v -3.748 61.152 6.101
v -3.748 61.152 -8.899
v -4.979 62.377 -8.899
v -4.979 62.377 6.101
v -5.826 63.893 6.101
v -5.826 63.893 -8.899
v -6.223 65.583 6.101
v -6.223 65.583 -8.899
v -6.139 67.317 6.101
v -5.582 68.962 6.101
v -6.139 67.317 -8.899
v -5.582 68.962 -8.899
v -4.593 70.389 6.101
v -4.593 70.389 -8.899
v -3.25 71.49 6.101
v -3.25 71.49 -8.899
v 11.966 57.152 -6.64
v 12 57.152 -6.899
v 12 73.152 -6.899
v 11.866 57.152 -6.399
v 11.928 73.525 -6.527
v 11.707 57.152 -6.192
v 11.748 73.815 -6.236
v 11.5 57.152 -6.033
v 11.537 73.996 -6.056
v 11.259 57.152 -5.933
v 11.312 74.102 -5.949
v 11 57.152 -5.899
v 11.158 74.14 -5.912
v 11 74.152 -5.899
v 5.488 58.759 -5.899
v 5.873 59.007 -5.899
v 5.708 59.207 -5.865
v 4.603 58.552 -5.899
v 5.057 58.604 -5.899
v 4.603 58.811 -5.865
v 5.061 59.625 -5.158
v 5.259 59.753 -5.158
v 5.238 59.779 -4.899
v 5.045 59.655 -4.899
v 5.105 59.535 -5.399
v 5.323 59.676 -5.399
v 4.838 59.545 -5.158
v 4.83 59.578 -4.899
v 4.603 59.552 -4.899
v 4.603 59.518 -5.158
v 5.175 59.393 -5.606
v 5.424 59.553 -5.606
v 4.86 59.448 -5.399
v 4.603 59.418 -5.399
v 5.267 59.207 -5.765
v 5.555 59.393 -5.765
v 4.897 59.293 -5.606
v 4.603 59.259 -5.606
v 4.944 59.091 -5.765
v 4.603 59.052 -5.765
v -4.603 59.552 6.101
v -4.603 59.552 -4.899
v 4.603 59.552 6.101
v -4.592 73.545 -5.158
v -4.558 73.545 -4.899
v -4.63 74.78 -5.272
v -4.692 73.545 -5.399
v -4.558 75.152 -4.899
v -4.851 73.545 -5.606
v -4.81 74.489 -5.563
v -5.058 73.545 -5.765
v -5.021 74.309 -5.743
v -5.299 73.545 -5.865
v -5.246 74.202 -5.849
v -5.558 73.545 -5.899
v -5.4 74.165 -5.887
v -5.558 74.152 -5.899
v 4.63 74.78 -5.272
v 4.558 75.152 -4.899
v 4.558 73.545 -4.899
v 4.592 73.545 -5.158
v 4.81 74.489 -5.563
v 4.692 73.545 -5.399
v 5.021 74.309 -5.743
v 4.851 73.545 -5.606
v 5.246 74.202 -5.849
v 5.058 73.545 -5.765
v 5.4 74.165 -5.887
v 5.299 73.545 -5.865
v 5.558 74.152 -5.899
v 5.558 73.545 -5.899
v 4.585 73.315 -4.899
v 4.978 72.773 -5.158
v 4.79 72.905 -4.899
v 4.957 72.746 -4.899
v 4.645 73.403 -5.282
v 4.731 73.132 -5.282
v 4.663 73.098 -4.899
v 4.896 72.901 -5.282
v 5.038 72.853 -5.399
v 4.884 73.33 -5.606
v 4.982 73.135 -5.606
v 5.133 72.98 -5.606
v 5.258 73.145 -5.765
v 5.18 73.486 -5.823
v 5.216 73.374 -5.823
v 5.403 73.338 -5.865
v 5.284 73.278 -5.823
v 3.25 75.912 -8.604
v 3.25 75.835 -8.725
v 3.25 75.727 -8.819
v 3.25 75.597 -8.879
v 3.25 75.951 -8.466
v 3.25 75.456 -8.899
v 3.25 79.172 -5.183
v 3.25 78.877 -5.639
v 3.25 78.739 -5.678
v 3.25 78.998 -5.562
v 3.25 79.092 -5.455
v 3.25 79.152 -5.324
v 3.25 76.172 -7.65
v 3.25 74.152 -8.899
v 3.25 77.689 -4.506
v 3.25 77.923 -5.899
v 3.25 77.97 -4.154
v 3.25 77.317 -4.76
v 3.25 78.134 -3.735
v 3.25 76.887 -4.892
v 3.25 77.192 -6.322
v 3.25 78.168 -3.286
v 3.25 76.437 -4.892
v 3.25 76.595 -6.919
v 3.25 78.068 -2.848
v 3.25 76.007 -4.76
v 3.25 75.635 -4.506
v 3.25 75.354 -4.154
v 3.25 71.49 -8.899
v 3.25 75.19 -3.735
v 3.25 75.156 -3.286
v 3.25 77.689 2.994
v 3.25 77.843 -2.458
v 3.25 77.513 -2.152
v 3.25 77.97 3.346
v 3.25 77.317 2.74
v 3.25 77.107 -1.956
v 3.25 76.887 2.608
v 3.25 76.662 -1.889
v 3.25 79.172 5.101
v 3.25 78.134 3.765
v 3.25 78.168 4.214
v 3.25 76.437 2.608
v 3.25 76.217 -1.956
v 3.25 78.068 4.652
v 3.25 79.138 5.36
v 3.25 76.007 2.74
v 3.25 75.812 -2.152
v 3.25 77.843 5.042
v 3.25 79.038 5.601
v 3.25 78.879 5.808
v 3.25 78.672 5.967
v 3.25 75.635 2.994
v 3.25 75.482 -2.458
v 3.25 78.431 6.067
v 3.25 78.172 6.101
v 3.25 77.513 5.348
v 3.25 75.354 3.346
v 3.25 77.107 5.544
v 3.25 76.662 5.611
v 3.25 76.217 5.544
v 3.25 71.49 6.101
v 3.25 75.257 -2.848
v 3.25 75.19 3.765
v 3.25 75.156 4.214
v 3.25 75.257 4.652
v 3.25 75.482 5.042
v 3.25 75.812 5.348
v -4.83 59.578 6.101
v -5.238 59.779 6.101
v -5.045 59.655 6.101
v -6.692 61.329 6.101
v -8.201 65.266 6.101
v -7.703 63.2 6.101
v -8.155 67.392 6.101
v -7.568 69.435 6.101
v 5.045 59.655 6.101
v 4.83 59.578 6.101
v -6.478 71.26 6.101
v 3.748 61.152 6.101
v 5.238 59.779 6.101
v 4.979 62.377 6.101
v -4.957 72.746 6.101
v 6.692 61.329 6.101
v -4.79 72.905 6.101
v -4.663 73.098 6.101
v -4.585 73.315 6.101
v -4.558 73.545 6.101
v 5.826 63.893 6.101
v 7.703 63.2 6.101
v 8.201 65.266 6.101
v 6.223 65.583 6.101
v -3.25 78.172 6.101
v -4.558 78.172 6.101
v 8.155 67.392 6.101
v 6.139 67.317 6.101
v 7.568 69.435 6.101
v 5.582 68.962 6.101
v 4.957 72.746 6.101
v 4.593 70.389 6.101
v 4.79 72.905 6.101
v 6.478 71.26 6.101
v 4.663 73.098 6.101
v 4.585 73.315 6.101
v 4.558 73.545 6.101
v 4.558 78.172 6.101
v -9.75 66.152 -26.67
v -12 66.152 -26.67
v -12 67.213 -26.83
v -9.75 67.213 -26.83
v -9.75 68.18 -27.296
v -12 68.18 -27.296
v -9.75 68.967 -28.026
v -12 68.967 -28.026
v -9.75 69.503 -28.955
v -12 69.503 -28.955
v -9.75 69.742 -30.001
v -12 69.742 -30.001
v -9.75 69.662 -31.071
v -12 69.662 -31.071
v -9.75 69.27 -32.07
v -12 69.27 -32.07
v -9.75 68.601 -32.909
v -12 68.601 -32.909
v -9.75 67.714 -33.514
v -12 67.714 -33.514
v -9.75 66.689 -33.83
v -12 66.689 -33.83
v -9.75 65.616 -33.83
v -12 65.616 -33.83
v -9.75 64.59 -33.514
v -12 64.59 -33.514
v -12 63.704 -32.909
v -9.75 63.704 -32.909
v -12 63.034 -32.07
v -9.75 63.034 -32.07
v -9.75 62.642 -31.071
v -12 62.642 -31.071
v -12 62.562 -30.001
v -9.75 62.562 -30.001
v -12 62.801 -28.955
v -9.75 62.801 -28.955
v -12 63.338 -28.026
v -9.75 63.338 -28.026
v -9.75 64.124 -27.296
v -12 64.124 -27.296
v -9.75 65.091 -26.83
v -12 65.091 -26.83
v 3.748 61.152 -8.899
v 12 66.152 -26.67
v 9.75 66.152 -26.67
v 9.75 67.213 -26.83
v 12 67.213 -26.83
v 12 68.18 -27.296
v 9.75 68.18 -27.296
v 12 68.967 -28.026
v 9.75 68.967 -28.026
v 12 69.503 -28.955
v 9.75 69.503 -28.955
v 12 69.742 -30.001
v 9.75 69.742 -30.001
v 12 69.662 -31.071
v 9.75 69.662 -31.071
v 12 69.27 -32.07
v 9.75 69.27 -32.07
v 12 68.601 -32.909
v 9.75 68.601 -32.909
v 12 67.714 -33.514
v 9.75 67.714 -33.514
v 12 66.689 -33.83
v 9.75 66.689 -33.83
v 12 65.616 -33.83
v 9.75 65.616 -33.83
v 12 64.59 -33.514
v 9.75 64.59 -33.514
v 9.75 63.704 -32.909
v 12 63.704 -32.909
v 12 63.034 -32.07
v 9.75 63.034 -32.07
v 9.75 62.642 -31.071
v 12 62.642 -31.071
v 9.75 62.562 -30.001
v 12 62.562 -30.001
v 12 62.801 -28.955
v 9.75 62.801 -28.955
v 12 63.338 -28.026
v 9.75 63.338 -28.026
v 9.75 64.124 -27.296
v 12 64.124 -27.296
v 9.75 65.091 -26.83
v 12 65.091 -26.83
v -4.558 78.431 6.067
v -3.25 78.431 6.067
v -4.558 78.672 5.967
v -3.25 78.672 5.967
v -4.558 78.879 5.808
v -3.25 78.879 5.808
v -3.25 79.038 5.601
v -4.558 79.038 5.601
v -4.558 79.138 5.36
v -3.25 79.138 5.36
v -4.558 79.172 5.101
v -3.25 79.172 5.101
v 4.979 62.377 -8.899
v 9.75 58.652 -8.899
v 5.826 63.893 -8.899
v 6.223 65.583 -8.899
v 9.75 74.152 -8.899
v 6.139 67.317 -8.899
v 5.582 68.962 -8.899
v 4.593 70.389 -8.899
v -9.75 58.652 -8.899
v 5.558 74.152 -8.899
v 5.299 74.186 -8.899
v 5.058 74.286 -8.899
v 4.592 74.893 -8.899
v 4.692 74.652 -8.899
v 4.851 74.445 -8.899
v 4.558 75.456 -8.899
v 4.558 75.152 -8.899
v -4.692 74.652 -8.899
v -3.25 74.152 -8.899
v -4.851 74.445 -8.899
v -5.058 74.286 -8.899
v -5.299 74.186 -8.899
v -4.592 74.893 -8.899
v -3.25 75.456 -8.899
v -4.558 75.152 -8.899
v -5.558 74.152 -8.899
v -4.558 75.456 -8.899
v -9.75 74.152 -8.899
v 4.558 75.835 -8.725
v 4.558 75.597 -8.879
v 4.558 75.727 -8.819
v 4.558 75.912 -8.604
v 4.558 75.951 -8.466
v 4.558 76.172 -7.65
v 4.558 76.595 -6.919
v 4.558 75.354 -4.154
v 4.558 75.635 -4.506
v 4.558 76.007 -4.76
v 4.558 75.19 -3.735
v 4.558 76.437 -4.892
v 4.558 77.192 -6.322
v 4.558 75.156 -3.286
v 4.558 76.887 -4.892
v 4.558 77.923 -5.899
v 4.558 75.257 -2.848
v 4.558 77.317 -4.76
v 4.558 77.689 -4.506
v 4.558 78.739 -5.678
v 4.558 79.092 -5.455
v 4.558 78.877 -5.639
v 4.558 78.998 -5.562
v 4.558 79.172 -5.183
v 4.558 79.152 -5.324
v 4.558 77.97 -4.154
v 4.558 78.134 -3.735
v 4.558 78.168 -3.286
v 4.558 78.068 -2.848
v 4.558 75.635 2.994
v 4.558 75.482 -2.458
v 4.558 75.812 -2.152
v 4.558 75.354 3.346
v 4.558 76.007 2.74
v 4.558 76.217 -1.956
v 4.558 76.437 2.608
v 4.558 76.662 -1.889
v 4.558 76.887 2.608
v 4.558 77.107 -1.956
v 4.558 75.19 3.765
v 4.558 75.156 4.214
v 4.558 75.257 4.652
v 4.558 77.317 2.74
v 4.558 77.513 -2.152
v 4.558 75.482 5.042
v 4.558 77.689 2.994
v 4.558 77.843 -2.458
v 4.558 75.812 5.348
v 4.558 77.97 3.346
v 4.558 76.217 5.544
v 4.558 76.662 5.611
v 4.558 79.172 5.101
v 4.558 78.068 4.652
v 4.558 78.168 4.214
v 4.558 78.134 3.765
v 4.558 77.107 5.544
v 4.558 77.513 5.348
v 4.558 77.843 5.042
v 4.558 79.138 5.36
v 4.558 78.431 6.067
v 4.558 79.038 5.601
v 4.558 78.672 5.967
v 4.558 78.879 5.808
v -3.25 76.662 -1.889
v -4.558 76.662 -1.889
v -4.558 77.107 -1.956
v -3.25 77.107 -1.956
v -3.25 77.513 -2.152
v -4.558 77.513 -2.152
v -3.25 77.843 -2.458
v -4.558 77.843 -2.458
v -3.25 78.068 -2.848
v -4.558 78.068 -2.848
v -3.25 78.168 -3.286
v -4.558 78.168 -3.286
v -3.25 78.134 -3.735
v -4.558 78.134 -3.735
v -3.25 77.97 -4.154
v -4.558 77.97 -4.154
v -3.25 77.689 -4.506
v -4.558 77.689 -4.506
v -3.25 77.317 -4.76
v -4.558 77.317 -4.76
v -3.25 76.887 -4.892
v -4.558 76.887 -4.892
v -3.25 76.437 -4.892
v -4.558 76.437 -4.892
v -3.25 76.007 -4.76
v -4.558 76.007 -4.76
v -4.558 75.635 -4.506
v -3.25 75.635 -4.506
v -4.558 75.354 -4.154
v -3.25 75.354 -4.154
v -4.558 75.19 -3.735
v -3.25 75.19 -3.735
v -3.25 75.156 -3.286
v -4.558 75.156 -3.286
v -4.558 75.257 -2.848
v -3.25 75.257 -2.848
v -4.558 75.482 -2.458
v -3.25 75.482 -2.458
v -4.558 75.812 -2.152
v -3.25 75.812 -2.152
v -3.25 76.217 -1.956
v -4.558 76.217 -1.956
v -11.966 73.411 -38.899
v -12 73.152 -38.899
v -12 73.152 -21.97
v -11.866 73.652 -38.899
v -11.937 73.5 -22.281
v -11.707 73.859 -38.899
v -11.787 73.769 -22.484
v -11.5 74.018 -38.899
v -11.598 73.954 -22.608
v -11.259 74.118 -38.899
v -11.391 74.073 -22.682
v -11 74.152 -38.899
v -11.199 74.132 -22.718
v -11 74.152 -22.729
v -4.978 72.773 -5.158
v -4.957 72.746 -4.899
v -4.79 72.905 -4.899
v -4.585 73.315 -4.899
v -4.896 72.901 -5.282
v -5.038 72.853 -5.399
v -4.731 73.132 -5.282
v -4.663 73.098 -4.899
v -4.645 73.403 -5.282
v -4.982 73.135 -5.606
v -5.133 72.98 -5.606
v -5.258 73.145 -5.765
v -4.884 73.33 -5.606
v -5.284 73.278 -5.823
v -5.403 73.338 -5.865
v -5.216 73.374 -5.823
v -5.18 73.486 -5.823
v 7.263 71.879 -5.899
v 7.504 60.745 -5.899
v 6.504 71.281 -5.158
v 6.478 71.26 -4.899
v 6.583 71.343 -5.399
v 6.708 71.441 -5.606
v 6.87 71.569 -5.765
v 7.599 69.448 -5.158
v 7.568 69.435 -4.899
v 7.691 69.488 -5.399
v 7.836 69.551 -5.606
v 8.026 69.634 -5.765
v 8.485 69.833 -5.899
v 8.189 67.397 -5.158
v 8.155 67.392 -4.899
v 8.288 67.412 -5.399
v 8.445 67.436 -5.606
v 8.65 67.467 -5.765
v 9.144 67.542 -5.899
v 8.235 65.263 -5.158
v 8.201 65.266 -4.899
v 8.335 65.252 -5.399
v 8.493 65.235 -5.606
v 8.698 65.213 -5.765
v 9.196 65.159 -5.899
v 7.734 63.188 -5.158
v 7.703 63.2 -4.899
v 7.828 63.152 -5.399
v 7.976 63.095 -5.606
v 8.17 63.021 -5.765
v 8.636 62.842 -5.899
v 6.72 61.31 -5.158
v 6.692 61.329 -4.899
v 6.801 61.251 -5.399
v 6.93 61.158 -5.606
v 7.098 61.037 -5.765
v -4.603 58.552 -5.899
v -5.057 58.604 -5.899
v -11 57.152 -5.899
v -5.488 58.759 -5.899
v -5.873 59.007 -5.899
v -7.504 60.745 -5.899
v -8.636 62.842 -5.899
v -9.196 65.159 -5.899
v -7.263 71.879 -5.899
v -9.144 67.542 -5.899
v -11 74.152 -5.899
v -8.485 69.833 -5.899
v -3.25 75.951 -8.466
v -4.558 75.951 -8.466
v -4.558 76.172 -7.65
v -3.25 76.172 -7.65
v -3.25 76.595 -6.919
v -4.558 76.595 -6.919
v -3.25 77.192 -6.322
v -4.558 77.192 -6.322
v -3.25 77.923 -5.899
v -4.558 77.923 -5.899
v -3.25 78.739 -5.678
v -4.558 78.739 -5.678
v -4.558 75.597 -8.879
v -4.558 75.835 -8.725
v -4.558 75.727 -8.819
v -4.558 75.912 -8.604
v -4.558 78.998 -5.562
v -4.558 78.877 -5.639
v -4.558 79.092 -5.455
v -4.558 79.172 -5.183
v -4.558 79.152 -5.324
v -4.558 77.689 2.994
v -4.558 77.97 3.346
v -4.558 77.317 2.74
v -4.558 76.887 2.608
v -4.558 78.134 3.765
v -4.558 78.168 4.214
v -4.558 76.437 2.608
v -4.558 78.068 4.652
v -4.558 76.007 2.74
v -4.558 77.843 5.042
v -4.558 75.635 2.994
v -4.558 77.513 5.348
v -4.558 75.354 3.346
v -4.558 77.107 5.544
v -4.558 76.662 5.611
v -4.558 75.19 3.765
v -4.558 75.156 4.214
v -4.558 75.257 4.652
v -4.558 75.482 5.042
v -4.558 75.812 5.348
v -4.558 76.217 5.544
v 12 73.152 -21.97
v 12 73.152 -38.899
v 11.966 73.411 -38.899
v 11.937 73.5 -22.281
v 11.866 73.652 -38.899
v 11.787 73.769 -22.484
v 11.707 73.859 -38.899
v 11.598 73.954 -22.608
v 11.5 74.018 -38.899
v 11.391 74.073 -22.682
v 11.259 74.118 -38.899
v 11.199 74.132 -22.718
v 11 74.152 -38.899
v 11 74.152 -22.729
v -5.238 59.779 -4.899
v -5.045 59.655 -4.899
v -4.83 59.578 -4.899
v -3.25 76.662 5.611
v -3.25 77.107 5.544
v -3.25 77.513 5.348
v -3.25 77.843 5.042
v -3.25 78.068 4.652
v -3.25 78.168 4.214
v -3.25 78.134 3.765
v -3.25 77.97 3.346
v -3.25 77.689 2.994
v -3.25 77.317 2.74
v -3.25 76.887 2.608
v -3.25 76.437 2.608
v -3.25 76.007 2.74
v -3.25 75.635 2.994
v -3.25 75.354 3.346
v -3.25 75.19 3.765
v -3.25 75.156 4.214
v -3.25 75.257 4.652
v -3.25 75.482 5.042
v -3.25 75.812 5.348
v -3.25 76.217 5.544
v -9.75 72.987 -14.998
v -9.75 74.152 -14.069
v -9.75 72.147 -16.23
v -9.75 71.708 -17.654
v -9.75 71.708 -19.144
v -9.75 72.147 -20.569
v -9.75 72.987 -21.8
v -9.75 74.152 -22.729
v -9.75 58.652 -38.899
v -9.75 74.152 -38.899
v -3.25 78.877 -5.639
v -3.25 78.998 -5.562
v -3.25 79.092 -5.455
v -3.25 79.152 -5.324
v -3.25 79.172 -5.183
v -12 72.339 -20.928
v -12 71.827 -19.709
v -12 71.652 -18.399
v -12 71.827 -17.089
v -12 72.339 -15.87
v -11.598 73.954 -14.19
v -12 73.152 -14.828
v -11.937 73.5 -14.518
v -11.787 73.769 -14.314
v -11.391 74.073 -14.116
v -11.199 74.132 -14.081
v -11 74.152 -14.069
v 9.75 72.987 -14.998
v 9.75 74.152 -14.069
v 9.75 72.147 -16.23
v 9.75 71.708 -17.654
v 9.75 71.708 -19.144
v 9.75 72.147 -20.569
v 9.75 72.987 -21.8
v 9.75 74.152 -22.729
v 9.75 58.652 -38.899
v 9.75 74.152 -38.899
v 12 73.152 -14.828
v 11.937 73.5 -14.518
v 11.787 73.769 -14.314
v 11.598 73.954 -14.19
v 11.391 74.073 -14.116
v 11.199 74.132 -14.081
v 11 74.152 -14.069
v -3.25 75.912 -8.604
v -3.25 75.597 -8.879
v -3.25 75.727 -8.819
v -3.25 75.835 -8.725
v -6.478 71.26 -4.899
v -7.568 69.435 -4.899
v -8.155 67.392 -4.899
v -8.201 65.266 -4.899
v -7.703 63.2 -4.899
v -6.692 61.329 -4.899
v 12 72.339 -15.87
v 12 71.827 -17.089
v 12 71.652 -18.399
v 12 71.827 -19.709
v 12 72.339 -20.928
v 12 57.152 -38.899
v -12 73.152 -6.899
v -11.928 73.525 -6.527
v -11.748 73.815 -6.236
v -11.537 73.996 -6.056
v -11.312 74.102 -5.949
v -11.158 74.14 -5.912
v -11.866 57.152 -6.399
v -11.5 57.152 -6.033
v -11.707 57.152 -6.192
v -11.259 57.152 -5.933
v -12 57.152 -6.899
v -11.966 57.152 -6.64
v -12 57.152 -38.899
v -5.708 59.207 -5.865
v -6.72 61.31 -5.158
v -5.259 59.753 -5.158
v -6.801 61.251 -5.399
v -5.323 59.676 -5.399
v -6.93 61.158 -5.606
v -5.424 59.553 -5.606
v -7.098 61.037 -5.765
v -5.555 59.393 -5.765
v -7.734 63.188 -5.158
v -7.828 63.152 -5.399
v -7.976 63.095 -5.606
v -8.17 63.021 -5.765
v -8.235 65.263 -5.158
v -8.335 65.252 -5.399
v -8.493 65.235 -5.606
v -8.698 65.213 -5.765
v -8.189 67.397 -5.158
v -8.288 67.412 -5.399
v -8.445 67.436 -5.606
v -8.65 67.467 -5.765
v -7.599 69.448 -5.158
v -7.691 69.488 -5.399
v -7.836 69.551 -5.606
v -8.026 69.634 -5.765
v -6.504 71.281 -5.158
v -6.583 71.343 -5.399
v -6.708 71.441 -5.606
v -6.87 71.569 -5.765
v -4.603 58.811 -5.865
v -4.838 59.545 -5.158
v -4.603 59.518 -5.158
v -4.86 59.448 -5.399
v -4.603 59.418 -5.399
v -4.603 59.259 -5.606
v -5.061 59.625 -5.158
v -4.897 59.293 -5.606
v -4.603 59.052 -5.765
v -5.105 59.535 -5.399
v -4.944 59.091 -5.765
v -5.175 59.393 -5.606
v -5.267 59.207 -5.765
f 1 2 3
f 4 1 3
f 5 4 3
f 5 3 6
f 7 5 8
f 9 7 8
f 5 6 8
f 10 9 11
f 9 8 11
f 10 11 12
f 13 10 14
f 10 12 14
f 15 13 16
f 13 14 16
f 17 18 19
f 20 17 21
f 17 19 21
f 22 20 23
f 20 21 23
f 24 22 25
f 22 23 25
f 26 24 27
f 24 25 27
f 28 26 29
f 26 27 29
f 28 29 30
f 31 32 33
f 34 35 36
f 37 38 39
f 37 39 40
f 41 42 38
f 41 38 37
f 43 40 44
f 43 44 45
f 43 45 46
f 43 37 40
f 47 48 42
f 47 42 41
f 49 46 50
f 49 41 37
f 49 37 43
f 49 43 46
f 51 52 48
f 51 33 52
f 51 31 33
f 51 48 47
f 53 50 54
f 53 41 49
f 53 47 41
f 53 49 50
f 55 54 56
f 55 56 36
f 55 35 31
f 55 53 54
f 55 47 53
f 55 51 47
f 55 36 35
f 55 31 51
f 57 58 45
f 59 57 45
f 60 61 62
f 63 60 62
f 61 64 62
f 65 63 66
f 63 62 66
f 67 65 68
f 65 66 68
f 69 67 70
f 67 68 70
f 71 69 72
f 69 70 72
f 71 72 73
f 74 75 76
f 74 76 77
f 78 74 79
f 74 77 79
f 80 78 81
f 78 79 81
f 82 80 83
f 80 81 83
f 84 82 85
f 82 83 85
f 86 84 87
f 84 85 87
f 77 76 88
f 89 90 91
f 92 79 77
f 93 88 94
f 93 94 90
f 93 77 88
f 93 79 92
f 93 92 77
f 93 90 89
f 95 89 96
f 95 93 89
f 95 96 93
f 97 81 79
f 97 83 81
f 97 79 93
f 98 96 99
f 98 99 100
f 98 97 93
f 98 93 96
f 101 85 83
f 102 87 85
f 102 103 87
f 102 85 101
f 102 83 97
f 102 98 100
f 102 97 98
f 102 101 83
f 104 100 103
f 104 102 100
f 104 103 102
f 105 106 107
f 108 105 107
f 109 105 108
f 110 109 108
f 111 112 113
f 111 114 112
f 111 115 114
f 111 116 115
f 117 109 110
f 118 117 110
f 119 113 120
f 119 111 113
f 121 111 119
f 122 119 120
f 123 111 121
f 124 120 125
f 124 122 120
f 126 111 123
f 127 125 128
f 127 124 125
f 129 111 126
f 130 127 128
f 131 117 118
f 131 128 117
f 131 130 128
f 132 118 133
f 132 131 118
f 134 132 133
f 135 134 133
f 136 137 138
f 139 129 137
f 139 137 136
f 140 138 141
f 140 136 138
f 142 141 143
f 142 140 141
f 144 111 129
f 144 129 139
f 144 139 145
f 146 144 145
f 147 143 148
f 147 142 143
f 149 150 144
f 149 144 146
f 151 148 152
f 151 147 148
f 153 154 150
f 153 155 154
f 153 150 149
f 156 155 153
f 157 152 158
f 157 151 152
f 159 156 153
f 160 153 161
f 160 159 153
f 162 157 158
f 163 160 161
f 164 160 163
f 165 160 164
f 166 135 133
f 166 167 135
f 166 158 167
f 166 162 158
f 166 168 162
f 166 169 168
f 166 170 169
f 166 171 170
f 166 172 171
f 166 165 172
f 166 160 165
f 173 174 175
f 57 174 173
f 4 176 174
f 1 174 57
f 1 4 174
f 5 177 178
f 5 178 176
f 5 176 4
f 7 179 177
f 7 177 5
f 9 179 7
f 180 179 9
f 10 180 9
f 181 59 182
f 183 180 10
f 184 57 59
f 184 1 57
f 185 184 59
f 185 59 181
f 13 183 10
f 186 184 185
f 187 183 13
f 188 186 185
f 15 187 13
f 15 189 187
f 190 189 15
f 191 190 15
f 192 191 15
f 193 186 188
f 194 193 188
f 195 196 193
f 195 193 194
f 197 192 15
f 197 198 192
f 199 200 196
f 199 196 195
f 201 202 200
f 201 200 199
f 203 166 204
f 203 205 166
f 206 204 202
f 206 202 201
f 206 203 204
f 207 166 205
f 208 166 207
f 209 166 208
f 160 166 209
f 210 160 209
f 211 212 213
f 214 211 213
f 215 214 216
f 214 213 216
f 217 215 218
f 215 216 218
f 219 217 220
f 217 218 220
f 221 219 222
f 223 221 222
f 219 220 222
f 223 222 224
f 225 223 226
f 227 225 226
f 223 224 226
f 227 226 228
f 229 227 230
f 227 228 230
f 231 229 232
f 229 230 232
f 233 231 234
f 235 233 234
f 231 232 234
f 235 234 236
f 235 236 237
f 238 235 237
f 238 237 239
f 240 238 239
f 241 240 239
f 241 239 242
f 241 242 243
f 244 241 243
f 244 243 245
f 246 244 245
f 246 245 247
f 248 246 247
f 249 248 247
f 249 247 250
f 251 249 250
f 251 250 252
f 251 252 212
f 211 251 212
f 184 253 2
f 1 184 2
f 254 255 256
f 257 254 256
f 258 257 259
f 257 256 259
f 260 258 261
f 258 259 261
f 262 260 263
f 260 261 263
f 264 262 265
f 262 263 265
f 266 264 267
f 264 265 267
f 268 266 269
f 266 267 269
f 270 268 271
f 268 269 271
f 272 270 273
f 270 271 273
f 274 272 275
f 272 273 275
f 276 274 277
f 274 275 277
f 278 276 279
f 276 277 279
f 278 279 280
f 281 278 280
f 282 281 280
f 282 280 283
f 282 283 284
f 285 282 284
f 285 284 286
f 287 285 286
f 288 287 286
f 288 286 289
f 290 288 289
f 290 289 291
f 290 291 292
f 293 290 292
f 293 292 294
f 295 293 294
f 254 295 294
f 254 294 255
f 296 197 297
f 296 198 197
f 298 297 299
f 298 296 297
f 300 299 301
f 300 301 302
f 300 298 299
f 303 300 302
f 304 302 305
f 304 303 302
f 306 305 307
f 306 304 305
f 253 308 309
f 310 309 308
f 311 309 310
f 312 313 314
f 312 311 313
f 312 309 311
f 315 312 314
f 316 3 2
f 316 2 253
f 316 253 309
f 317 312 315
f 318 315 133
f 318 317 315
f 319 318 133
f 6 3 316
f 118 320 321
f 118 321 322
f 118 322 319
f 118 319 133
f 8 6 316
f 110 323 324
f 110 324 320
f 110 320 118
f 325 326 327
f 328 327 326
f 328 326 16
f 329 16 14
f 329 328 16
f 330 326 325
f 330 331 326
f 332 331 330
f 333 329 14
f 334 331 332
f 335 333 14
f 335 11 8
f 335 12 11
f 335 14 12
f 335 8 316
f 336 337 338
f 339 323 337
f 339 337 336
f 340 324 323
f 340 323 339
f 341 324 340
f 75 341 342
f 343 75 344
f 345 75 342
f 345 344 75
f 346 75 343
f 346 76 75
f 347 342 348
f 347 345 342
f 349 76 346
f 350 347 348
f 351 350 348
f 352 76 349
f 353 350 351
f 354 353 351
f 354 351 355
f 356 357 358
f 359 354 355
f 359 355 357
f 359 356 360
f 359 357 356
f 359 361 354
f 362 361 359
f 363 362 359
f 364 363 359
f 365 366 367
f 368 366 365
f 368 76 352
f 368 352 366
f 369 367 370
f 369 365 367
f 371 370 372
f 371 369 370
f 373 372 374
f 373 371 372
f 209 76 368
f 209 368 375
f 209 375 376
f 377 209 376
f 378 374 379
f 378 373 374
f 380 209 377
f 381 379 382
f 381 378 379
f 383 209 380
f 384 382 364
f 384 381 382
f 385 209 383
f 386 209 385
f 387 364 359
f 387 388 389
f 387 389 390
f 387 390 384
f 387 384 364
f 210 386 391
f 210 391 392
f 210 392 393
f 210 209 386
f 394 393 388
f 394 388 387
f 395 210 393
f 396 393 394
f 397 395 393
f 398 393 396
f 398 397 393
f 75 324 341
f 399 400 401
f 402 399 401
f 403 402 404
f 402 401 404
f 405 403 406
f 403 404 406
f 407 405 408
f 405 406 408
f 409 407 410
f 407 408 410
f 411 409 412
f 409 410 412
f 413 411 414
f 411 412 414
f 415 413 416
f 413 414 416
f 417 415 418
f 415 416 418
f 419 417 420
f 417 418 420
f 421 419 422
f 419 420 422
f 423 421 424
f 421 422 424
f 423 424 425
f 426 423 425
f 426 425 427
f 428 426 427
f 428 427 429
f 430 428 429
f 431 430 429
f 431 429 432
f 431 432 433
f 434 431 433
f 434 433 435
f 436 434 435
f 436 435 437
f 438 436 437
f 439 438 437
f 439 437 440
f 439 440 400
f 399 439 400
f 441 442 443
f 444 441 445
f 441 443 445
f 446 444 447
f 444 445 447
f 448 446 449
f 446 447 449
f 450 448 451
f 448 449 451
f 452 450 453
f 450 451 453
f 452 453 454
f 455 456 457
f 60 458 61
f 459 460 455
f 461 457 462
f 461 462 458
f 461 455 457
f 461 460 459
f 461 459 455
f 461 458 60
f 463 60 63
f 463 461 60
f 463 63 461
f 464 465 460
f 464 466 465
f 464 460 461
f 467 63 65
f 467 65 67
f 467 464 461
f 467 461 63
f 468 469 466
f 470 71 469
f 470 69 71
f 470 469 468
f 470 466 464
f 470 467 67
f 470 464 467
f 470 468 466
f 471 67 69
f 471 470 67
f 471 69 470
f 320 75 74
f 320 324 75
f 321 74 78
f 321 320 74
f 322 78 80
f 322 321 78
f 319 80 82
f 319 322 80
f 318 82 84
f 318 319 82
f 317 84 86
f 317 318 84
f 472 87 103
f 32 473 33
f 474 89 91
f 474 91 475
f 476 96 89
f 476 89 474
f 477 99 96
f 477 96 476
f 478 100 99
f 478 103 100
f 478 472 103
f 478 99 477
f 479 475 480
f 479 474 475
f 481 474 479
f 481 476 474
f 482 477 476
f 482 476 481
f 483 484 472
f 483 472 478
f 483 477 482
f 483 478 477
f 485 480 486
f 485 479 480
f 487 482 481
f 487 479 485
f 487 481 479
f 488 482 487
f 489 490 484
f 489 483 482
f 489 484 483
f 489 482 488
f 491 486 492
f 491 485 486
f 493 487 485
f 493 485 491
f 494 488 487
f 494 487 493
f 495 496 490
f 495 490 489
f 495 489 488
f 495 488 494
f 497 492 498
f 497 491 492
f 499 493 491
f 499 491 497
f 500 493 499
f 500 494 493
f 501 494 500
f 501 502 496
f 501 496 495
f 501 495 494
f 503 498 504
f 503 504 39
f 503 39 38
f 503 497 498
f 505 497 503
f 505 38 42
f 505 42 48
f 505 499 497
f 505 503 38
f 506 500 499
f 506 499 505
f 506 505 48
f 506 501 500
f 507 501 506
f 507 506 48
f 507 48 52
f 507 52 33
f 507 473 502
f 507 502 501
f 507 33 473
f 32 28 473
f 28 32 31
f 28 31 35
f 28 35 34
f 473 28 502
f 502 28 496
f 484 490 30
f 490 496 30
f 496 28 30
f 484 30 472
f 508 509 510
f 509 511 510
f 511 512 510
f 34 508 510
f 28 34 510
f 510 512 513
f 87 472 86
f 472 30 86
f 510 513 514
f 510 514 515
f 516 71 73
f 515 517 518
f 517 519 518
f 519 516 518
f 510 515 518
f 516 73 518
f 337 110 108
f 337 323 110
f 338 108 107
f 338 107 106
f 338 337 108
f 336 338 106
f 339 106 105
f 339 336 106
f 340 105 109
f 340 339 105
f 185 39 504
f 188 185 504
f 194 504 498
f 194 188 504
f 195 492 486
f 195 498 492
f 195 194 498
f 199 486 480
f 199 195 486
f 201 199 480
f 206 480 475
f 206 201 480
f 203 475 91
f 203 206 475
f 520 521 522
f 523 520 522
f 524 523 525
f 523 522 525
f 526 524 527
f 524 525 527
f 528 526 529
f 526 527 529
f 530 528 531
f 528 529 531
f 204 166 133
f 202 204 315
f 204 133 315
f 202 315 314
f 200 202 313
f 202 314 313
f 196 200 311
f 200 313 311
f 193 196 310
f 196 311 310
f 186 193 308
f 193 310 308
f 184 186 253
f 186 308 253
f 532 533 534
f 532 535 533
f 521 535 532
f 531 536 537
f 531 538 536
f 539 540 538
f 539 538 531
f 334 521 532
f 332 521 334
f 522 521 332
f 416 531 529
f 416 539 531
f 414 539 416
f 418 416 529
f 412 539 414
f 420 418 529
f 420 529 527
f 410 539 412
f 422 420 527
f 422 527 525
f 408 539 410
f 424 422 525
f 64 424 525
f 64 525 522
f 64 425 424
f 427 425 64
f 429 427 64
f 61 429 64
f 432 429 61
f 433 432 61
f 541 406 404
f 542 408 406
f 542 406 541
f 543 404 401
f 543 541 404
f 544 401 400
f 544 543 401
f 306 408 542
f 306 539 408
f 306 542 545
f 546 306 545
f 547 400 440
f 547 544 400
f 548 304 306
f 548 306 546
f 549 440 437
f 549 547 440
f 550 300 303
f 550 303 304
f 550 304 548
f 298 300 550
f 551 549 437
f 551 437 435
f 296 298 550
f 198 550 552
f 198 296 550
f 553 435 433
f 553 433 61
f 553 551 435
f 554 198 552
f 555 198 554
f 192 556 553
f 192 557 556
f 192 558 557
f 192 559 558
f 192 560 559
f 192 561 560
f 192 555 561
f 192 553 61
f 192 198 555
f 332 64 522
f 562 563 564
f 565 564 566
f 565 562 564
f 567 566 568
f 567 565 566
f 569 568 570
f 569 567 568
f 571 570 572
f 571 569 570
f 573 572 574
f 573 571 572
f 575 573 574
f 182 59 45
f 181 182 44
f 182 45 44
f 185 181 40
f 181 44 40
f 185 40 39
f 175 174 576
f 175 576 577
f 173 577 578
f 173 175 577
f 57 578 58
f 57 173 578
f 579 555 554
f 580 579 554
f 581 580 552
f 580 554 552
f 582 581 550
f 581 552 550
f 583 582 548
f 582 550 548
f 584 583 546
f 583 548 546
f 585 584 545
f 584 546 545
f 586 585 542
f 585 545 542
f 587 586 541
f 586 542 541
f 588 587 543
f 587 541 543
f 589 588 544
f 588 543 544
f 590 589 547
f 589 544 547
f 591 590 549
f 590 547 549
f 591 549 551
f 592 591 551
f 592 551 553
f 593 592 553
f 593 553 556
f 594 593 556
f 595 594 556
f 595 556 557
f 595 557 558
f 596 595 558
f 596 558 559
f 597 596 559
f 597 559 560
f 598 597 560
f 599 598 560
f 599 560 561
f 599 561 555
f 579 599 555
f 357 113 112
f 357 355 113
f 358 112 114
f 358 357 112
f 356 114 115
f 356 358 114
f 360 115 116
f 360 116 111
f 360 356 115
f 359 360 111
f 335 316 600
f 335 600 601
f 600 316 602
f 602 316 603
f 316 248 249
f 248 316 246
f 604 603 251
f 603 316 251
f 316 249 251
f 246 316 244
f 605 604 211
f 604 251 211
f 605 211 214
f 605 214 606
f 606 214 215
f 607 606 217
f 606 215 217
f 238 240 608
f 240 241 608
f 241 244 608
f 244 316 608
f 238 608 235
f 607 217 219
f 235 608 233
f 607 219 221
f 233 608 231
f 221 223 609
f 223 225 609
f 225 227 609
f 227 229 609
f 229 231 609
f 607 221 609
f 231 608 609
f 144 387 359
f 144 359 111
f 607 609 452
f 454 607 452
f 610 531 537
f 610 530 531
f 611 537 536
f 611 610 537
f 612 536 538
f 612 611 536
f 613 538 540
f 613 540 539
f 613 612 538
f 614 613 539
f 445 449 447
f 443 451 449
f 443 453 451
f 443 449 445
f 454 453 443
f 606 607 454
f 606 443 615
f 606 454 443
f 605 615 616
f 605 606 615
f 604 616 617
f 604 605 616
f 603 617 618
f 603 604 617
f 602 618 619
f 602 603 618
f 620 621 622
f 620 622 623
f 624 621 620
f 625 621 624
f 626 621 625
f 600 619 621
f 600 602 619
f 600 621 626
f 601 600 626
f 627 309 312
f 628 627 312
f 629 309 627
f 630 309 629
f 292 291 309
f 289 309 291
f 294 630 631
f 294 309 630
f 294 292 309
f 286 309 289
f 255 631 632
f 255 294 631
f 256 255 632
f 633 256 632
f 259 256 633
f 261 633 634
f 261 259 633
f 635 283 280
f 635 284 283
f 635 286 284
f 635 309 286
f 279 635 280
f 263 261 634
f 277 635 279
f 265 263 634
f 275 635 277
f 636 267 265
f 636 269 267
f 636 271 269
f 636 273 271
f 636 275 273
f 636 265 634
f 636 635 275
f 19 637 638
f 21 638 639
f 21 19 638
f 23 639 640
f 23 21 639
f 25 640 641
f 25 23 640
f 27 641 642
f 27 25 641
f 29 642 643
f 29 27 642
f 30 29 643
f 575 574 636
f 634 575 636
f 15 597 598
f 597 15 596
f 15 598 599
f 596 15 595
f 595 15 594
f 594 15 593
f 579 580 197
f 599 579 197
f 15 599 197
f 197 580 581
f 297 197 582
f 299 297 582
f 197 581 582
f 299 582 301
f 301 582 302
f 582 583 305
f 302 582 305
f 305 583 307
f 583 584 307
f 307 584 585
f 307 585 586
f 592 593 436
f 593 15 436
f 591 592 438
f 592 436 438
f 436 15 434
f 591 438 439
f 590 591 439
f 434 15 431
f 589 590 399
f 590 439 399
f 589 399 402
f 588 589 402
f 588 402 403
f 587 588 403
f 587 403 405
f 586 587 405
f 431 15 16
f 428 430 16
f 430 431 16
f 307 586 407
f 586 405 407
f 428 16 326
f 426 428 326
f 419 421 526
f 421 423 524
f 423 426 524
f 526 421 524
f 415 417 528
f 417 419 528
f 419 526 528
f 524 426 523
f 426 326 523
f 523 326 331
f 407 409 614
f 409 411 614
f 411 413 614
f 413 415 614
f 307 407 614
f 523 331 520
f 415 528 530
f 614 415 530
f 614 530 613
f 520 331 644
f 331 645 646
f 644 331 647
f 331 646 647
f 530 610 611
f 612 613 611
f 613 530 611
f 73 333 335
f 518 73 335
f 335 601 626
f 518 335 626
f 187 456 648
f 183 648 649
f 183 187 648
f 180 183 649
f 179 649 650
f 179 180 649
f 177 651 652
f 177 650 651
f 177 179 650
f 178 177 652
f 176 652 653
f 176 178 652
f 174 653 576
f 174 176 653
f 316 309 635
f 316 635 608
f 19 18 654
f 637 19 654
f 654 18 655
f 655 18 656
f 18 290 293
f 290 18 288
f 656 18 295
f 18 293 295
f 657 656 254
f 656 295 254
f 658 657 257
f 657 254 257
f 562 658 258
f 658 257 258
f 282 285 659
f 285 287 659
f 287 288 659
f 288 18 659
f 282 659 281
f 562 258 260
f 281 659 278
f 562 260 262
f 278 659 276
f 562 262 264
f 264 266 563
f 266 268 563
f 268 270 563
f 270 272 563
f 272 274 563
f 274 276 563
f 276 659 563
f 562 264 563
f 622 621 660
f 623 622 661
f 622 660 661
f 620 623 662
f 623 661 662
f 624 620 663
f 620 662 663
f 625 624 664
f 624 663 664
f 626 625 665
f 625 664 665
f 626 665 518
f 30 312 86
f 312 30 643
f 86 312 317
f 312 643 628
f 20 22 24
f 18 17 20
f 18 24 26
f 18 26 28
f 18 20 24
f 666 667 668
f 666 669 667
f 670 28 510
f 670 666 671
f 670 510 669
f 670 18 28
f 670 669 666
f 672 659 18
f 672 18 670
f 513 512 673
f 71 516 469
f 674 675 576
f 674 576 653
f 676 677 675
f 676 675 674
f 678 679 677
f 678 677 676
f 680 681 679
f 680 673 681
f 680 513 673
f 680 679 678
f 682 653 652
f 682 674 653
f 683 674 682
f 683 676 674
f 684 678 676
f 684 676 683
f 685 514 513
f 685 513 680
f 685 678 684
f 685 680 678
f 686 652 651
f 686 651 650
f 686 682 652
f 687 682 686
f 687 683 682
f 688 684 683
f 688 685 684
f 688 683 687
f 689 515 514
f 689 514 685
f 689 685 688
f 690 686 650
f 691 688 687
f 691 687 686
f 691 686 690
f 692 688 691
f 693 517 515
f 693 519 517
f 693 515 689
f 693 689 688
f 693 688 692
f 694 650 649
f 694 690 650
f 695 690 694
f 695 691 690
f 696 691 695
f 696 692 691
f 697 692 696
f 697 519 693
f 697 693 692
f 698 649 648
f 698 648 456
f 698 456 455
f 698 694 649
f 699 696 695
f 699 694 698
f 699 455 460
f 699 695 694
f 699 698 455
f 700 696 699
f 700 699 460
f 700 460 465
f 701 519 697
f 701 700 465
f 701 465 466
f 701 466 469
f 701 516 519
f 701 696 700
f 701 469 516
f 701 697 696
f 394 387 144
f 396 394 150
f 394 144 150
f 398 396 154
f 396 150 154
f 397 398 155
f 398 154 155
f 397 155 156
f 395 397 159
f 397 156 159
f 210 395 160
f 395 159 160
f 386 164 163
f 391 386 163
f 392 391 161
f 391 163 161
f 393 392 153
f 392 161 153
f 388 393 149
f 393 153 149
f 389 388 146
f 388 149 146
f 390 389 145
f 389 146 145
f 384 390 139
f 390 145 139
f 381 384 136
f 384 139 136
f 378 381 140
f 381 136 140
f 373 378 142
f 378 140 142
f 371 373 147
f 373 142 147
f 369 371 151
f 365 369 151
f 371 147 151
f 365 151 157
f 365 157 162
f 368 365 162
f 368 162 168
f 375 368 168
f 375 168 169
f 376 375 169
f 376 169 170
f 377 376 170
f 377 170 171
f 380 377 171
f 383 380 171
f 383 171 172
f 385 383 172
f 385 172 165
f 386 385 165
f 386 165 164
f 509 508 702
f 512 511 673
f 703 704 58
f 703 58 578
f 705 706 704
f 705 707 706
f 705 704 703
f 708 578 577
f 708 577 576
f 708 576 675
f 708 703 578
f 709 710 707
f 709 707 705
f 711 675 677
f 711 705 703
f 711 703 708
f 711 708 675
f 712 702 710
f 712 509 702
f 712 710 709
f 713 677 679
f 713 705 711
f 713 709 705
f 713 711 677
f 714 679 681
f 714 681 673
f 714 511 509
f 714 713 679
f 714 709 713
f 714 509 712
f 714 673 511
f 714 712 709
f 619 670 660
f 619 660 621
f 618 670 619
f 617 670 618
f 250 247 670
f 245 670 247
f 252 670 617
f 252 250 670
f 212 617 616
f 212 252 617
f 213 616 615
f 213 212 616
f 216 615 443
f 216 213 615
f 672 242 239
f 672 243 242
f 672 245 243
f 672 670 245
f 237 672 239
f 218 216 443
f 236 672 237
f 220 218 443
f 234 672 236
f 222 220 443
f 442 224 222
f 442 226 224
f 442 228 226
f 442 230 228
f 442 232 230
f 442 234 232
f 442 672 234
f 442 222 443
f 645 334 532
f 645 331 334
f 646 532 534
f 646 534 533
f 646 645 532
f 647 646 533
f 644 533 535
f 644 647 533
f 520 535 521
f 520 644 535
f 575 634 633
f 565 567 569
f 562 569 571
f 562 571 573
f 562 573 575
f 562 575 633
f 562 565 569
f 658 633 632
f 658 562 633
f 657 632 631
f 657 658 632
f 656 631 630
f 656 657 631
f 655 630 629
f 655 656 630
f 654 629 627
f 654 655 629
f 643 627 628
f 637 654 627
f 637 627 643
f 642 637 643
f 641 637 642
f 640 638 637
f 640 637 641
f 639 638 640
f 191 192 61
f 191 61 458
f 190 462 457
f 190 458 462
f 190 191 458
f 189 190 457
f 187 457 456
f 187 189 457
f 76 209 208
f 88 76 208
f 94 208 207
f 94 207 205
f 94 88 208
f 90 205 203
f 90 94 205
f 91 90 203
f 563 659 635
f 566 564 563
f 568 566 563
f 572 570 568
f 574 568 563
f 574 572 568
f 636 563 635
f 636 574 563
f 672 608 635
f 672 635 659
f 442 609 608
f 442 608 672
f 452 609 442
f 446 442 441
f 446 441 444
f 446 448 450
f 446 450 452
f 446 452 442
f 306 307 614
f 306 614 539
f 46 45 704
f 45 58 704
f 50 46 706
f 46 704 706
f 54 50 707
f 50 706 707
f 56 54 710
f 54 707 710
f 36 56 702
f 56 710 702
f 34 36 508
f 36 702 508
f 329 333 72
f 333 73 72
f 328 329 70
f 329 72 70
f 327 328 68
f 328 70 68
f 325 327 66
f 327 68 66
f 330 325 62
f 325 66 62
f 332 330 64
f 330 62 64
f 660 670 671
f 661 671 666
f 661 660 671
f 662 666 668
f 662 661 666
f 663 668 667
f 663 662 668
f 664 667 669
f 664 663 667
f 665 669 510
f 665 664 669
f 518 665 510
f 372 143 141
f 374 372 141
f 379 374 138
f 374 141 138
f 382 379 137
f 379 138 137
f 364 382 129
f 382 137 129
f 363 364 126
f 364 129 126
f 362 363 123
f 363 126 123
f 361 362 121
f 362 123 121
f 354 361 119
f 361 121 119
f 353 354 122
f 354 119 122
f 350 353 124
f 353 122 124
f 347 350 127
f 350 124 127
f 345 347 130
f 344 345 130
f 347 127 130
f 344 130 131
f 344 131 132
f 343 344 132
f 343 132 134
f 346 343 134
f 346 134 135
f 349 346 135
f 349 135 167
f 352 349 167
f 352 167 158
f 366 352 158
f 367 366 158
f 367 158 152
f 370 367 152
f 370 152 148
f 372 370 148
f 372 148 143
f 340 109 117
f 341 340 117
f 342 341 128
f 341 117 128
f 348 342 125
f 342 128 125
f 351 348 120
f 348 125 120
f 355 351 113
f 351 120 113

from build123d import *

# Parameters (mm, degrees)
BOSS_EXTRUDE1_DEPTH      = 6.100789
BOSS_EXTRUDE1_DEPTH_BACK = 8.899211
SKETCH2_R                = 1.51
CUT_EXTRUDE1_DEPTH       = 13.807078357
FILLET1_R                = 1
SKETCH3_W                = 24
SKETCH3_H                = 17
BOSS_EXTRUDE2_DEPTH      = 30
BOSS_EXTRUDE2_DEPTH_BACK = 3
SKETCH4_W                = 19.5
SKETCH4_H                = 15.5
CUT_EXTRUDE2_DEPTH       = 30
CUT_EXTRUDE6_DEPTH       = 3
FILLET2_R                = 1
SKETCH7_R                = 3.6
CUT_EXTRUDE7_DEPTH       = 25
CUT_EXTRUDE8_DEPTH       = 1
CUT_EXTRUDE8_DEPTH_BACK  = 25
CUT_EXTRUDE9_DEPTH       = 17.558078457
FILLET3_R                = 0.5


with BuildPart() as part:
    # Sketch1 → Boss-Extrude1 (new body, two sides)
    with BuildSketch(Plane.XY) as boss_extrude1_sk:
        with BuildLine():
            Line((4.558078357, 79.172152098), (3.25, 79.172152098))
            Line((3.25, 79.172152098), (3.25, 71.489520457))
            ThreePointArc((3.25, 71.489520457), (6.241751571, 66.453047962), (3.748333096, 61.152152098))
            Line((3.748333096, 61.152152098), (-3.748333096, 61.152152098))
            ThreePointArc((-3.748333096, 61.152152098), (-6.241751571, 66.453047962), (-3.25, 71.489520457))
            Line((-3.25, 71.489520457), (-3.25, 79.172152098))
            Line((-3.25, 79.172152098), (-4.558078357, 79.172152098))
            Line((-4.558078357, 79.172152098), (-4.558078357, 73.02746465))
            ThreePointArc((-4.558078357, 73.02746465), (-8.245549035, 66.39073565), (-4.947991632, 59.551896057))
            Line((-4.947991632, 59.551896057), (4.947991632, 59.551896057))
            ThreePointArc((4.947991632, 59.551896057), (8.245549035, 66.39073565), (4.558078357, 73.02746465))
            Line((4.558078357, 73.02746465), (4.558078357, 79.172152098))
        make_face()
    extrude(amount=BOSS_EXTRUDE1_DEPTH)
    extrude(boss_extrude1_sk.sketch, amount=-BOSS_EXTRUDE1_DEPTH_BACK)

    # Sketch2 → Cut-Extrude1 (cut, through all)
    with BuildSketch(Plane.ZY.offset(4.558078357)):
        with Locations((4.10078902, 76.662152098)):
            Circle(SKETCH2_R)
        with Locations((-3.39921098, 76.662152098)):
            Circle(SKETCH2_R)
    extrude(amount=-CUT_EXTRUDE1_DEPTH, mode=Mode.SUBTRACT)

    # Fillet1
    fillet1_edges = [part.edges().sort_by_distance(p)[0] for p in [
        (4.558078357, 73.02746465, -1.399211),
        (4.947991632, 59.551896057, -1.399211),
        (-4.947991632, 59.551896057, -1.399211),
        (-4.558078357, 73.02746465, -1.399211),
        (-3.904039179, 79.172152098, 6.100789),
        (3.904039179, 79.172152098, 6.100789),
        (3.904039179, 79.172152098, -8.899211),
        (-3.904039179, 79.172152098, -8.899211),
    ]]
    fillet(fillet1_edges, radius=FILLET1_R)

    # Sketch3 → Boss-Extrude2 (add, two sides)
    with BuildSketch(Plane(origin=(0, 0, -8.89921098), x_dir=(-1, 0, 0), z_dir=(0, 0, -1))) as boss_extrude2_sk:
        with Locations((0, 65.652152098)):
            Rectangle(SKETCH3_W, SKETCH3_H)
    extrude(amount=BOSS_EXTRUDE2_DEPTH)
    extrude(boss_extrude2_sk.sketch, amount=-BOSS_EXTRUDE2_DEPTH_BACK)

    # Sketch4 → Cut-Extrude2 (cut)
    with BuildSketch(Plane(origin=(0, 0, -38.89921098), x_dir=(-1, 0, 0), z_dir=(0, 0, -1))):
        with Locations((0, 66.402152098)):
            Rectangle(SKETCH4_W, SKETCH4_H)
    extrude(amount=-CUT_EXTRUDE2_DEPTH, mode=Mode.SUBTRACT)

    # Sketch6 → Cut-Extrude6 (cut)
    with BuildSketch(Plane(origin=(0, 0, -8.89921098), x_dir=(-1, 0, 0), z_dir=(0, 0, -1))):
        with BuildLine():
            Line((-3.25, 74.152152098), (-3.25, 71.489520457))
            ThreePointArc((-3.25, 71.489520457), (-6.241751571, 66.453047962), (-3.748333096, 61.152152098))
            Line((-3.748333096, 61.152152098), (3.748333096, 61.152152098))
            ThreePointArc((3.748333096, 61.152152098), (6.241751571, 66.453047962), (3.25, 71.489520457))
            Line((3.25, 71.489520457), (3.25, 74.152152098))
            Line((3.25, 74.152152098), (-3.25, 74.152152098))
        make_face()
    extrude(amount=-CUT_EXTRUDE6_DEPTH, mode=Mode.SUBTRACT)

    # Fillet2
    fillet2_edges = [part.edges().sort_by_distance(p)[0] for p in [
        (-4.663388941, 73.09814661, -5.89921098),
        (12, 74.152152098, -22.39921098),
        (-4.558078357, 74.152152098, -7.39921099),
        (4.558078357, 73.848493734, -5.89921098),
        (4.663388941, 73.09814661, -5.89921098),
        (8.247069912, 66.330586564, -5.89921098),
        (0, 59.551896057, -5.89921098),
        (-8.247069912, 66.330586564, -5.89921098),
        (-4.558078357, 73.848493734, -5.89921098),
        (12, 65.652152098, -5.89921098),
        (4.558078357, 74.152152098, -7.39921099),
        (-12, 74.152152098, -22.39921098),
        (-12, 65.652152098, -5.89921098),
        (-4.939958239, 59.610472754, -5.89921098),
        (4.939958239, 59.610472754, -5.89921098),
    ]]
    fillet(fillet2_edges, radius=FILLET2_R)

    # Sketch7 → Cut-Extrude7 (cut, through all)
    with BuildSketch(Plane.ZY.offset(12)):
        with Locations((-30.270250022, 66.152152098)):
            Circle(SKETCH7_R)
    extrude(amount=-CUT_EXTRUDE7_DEPTH, mode=Mode.SUBTRACT)

    # Sketch8 → Cut-Extrude8 (cut, two sides)
    with BuildSketch(Plane(origin=(12, 0, 0), x_dir=(0, 0, -1), z_dir=(1, 0, 0))) as cut_extrude8_sk:
        with BuildLine():
            Line((14.069083961, 74.152152098), (22.729337999, 74.152152098))
            ThreePointArc((22.729337999, 74.152152098), (18.39921098, 71.652152098), (14.069083961, 74.152152098))
        make_face()
    extrude(amount=CUT_EXTRUDE8_DEPTH, mode=Mode.SUBTRACT)
    extrude(cut_extrude8_sk.sketch, amount=-CUT_EXTRUDE8_DEPTH_BACK, mode=Mode.SUBTRACT)

    # Sketch9 → Cut-Extrude9 (cut, through all)
    with BuildSketch(Plane.ZY.offset(4.558078357)):
        with BuildLine():
            Line((-8.89921098, 78.172152098), (-8.89921098, 75.922152098))
            ThreePointArc((-8.89921098, 75.922152098), (-6.601113941, 76.874055059), (-5.64921098, 79.172152098))
            Line((-5.64921098, 79.172152098), (-7.89921098, 79.172152098))
            ThreePointArc((-7.89921098, 79.172152098), (-8.606317761, 78.879258879), (-8.89921098, 78.172152098))
        make_face()
    extrude(amount=-CUT_EXTRUDE9_DEPTH, mode=Mode.SUBTRACT)

    # Fillet3
    fillet3_edges = [part.edges().sort_by_distance(p)[0] for p in [
        (-3.904039179, 79.172152098, -5.64921098),
        (3.904039179, 79.172152098, -5.64921098),
        (-3.904039179, 75.922152098, -8.89921098),
        (3.904039179, 75.922152098, -8.89921098),
    ]]
    fillet(fillet3_edges, radius=FILLET3_R)


solid = part.part
